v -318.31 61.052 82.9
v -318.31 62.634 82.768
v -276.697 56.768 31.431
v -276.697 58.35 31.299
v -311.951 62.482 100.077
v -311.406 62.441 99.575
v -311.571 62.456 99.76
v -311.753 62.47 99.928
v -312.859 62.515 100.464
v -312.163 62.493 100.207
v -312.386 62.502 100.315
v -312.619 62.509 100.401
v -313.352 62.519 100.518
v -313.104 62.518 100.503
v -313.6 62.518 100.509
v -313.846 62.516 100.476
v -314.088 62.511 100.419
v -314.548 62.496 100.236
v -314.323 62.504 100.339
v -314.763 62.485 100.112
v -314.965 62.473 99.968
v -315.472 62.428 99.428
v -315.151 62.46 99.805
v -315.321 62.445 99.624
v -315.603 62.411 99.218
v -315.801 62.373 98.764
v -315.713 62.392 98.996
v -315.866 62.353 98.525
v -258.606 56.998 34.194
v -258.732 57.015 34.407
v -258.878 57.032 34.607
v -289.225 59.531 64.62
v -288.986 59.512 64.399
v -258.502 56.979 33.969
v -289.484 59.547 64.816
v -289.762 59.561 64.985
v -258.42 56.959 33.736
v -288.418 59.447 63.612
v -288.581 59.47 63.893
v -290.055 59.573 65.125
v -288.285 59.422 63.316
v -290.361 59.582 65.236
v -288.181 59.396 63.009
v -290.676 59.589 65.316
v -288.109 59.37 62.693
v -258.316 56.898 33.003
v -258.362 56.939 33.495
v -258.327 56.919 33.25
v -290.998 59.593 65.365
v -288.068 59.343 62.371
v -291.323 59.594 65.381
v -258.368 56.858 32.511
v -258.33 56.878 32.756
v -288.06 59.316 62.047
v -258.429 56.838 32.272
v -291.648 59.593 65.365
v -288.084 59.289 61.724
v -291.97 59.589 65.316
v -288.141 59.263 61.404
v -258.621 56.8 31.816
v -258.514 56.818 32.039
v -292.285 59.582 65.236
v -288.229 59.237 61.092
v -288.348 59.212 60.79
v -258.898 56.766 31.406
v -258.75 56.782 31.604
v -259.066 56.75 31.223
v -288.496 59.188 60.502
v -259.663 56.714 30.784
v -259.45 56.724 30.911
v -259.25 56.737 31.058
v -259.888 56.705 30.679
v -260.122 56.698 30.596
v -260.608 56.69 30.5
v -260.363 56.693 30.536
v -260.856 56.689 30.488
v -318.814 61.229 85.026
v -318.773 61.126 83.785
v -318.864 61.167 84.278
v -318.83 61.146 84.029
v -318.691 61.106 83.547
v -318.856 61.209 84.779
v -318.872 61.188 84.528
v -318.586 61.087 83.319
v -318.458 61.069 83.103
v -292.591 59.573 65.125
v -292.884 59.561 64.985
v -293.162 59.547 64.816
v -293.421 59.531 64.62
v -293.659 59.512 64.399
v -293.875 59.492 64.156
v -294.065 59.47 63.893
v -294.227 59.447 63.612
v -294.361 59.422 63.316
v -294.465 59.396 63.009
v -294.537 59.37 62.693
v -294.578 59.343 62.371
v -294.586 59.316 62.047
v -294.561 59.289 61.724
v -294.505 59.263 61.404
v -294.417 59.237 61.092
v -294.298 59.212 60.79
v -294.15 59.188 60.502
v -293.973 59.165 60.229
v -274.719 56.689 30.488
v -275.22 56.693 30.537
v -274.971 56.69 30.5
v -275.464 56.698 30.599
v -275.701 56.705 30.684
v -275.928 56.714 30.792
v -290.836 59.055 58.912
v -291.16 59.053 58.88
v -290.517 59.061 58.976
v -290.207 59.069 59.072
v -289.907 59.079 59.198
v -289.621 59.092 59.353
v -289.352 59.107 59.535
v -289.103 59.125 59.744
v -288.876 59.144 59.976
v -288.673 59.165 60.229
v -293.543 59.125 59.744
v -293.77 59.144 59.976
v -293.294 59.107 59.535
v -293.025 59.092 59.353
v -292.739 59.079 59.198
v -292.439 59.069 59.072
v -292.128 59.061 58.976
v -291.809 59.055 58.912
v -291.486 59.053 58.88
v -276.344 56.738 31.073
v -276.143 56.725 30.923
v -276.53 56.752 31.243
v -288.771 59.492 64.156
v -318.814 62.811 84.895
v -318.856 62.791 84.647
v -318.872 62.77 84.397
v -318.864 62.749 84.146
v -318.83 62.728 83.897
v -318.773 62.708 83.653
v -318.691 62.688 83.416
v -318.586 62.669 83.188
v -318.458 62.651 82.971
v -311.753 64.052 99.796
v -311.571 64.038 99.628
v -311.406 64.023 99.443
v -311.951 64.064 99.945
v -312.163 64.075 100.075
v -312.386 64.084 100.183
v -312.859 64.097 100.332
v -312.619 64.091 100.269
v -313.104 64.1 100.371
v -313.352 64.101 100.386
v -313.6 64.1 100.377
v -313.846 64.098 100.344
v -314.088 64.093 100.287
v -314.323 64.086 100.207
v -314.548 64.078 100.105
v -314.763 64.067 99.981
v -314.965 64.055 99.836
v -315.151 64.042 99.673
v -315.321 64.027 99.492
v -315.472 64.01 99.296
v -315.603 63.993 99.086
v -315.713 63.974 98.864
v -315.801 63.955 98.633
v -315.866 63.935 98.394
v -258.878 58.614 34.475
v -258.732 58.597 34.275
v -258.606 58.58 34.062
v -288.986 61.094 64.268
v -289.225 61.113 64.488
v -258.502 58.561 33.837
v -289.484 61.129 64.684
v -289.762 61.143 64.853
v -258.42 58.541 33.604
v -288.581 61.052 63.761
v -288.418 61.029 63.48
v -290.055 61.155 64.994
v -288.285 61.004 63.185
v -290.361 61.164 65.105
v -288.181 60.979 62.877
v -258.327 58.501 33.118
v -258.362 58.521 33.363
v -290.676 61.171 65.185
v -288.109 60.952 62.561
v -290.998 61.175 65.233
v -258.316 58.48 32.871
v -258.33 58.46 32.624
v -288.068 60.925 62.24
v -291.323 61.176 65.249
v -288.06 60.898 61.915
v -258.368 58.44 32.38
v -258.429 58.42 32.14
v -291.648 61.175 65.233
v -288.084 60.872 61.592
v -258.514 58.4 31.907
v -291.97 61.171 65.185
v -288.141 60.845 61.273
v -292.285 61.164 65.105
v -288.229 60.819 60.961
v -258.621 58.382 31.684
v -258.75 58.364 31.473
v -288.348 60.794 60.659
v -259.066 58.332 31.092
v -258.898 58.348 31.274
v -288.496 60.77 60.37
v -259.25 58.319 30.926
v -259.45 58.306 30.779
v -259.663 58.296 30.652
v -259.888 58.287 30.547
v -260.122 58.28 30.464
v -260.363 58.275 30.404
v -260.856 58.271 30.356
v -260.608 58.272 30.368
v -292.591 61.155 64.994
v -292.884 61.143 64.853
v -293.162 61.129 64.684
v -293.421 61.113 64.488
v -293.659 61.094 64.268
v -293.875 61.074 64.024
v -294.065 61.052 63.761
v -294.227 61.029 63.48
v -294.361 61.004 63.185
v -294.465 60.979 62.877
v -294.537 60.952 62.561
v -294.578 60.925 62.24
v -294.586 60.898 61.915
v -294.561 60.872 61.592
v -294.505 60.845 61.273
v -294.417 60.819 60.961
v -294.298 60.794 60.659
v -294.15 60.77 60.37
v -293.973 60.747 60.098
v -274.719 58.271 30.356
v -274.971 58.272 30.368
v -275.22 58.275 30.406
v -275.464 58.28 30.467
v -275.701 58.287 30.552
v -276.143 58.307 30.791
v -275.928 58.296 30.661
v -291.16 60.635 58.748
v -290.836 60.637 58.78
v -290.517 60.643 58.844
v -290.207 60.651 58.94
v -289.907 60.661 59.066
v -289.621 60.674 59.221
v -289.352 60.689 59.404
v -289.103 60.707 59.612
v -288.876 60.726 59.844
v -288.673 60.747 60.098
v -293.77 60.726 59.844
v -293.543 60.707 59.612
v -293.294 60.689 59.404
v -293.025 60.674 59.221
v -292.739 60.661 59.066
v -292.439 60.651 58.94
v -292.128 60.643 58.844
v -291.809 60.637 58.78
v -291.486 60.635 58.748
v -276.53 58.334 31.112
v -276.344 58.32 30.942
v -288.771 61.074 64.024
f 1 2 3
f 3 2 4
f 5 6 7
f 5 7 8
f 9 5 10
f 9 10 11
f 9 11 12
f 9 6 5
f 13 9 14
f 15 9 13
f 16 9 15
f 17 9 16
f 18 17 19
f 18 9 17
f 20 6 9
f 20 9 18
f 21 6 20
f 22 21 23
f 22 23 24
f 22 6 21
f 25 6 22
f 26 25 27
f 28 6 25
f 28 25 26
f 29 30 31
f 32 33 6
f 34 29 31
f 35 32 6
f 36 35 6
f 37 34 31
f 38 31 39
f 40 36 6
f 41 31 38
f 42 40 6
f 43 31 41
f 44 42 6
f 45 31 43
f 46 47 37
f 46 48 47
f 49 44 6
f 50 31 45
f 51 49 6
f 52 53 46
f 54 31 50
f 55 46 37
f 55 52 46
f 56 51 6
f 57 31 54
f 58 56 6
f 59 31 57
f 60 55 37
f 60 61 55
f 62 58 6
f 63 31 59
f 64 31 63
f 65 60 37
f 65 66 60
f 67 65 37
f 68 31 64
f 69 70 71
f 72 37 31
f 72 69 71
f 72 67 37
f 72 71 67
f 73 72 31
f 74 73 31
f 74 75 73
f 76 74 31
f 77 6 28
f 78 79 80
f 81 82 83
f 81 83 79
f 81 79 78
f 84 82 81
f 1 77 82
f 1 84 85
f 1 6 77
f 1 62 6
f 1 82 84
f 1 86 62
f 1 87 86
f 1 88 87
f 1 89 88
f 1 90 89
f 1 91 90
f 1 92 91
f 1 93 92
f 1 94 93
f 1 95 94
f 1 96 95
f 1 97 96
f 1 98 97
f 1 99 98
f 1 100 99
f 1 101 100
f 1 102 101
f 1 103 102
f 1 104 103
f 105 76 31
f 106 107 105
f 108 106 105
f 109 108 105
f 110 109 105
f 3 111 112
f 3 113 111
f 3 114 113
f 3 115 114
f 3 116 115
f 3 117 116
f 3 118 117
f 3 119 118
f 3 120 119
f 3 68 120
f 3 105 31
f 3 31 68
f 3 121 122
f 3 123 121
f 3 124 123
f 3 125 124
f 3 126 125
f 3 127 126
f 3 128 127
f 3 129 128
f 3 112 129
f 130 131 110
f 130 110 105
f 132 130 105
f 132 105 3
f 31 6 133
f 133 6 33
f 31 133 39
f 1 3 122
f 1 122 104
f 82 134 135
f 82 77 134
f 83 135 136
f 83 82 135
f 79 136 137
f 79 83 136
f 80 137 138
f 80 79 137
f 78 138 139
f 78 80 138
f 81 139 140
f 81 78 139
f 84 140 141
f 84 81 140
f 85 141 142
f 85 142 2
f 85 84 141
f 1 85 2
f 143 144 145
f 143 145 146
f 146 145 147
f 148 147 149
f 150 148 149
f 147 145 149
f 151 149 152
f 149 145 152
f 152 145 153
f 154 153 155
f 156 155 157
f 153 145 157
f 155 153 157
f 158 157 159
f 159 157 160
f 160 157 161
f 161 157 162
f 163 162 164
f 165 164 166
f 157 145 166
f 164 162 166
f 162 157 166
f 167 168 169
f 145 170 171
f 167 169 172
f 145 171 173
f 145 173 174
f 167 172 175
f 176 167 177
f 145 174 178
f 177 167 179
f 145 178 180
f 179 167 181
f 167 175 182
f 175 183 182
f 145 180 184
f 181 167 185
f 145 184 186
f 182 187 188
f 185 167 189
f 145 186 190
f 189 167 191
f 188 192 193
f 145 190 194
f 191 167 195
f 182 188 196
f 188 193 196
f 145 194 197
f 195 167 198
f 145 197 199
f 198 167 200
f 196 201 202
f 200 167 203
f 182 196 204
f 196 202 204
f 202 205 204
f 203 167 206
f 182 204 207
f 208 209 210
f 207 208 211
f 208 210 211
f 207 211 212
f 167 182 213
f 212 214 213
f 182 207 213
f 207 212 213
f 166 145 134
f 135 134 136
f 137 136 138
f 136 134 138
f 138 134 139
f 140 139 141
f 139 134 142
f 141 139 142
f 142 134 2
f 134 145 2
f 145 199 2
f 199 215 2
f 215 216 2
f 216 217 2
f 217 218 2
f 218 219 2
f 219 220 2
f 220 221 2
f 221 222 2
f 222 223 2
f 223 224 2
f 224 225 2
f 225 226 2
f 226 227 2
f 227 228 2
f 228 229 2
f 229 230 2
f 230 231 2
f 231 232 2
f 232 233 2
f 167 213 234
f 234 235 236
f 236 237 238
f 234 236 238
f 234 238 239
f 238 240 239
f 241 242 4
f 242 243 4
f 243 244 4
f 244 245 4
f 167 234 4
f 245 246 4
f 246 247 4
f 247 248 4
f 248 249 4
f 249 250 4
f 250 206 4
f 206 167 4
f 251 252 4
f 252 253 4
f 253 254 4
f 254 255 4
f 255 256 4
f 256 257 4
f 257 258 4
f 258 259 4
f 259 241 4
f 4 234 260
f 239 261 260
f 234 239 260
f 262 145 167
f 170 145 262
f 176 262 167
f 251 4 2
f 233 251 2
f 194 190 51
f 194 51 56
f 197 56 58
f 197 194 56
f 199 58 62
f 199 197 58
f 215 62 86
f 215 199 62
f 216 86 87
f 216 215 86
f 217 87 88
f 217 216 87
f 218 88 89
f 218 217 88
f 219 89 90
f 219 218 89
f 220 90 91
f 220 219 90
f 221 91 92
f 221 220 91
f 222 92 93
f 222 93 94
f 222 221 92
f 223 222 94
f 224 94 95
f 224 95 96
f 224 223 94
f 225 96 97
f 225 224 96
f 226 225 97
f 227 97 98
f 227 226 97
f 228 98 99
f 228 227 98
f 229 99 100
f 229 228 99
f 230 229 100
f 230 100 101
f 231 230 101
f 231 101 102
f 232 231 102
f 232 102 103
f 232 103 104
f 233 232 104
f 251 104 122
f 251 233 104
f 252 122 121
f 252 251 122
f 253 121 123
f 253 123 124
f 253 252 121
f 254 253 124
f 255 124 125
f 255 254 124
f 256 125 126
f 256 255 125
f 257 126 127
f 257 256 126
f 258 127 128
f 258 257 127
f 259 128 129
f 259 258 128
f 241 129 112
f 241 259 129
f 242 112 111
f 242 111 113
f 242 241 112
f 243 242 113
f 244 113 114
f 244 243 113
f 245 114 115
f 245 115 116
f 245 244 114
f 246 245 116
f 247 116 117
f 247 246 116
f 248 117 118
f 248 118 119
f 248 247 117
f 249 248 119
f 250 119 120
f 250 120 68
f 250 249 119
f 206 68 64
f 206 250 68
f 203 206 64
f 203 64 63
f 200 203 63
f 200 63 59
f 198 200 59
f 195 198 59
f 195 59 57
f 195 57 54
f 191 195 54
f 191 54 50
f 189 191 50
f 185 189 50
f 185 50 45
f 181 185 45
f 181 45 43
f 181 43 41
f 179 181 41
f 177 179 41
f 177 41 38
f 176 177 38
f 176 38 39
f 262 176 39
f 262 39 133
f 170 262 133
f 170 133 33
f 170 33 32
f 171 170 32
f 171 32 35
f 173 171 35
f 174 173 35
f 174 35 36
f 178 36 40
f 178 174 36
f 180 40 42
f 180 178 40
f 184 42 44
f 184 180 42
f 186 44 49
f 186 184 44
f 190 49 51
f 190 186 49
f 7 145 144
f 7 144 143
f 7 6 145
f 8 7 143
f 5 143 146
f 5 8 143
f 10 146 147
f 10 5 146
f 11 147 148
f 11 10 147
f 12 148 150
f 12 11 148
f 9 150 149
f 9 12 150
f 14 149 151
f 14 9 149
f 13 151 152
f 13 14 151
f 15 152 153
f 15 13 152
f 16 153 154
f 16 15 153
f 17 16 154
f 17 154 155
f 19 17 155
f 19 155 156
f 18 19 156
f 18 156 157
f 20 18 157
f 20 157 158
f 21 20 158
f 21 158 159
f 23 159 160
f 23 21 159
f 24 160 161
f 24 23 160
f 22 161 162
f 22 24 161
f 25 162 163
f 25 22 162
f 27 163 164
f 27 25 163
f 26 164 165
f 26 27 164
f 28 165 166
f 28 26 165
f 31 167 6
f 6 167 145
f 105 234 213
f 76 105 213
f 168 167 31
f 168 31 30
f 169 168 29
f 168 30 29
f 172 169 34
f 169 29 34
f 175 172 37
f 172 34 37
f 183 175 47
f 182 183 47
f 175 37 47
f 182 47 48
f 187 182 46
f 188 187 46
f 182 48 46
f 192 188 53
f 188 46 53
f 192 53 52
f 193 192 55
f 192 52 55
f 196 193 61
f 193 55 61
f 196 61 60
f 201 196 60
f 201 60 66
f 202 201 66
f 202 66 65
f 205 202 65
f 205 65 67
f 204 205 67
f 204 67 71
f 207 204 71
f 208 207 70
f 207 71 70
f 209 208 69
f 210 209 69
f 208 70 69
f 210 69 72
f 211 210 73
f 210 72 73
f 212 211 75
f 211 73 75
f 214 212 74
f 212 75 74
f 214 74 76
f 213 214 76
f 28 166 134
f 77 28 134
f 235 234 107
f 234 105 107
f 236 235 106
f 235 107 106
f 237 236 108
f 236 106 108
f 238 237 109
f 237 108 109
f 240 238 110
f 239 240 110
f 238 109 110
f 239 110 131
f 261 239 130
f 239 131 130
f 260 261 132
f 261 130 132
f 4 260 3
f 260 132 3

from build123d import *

# Parameters (mm, degrees)
SKETCH2_R           = 3.2639
BOSS_EXTRUDE1_DEPTH = 1.5875
FILLET1_R           = 2.54


with BuildPart() as part:
    # Sketch2 → Boss-Extrude1 (new body)
    with BuildSketch(Plane(origin=(0, 55.360225049, -4.608794225), x_dir=(-1, 0, 0), z_dir=(1.3350431871117514e-14, -0.9965525450230818, 0.0829639982644206))):
        Polygon((255.547712488, -35.085636701), (314.736370081, -108.545763081), (319.072942794, -88.62551032), (275.934530116, -35.085636701), align=None)
        with Locations((291.32288887, -66.835636701)):
            Circle(SKETCH2_R, mode=Mode.SUBTRACT)
    extrude(amount=BOSS_EXTRUDE1_DEPTH)

    # Fillet1
    fillet1_edges = [part.edges().sort_by_distance(p)[0] for p in [
        (-275.934530116, 57.480056169, 30.421738996),
        (-255.547712488, 57.480056169, 30.421738996),
        (-319.072942794, 61.921938151, 83.777036311),
        (-314.736370081, 63.574601966, 103.628614898),
    ]]
    fillet(fillet1_edges, radius=FILLET1_R)


solid = part.part
